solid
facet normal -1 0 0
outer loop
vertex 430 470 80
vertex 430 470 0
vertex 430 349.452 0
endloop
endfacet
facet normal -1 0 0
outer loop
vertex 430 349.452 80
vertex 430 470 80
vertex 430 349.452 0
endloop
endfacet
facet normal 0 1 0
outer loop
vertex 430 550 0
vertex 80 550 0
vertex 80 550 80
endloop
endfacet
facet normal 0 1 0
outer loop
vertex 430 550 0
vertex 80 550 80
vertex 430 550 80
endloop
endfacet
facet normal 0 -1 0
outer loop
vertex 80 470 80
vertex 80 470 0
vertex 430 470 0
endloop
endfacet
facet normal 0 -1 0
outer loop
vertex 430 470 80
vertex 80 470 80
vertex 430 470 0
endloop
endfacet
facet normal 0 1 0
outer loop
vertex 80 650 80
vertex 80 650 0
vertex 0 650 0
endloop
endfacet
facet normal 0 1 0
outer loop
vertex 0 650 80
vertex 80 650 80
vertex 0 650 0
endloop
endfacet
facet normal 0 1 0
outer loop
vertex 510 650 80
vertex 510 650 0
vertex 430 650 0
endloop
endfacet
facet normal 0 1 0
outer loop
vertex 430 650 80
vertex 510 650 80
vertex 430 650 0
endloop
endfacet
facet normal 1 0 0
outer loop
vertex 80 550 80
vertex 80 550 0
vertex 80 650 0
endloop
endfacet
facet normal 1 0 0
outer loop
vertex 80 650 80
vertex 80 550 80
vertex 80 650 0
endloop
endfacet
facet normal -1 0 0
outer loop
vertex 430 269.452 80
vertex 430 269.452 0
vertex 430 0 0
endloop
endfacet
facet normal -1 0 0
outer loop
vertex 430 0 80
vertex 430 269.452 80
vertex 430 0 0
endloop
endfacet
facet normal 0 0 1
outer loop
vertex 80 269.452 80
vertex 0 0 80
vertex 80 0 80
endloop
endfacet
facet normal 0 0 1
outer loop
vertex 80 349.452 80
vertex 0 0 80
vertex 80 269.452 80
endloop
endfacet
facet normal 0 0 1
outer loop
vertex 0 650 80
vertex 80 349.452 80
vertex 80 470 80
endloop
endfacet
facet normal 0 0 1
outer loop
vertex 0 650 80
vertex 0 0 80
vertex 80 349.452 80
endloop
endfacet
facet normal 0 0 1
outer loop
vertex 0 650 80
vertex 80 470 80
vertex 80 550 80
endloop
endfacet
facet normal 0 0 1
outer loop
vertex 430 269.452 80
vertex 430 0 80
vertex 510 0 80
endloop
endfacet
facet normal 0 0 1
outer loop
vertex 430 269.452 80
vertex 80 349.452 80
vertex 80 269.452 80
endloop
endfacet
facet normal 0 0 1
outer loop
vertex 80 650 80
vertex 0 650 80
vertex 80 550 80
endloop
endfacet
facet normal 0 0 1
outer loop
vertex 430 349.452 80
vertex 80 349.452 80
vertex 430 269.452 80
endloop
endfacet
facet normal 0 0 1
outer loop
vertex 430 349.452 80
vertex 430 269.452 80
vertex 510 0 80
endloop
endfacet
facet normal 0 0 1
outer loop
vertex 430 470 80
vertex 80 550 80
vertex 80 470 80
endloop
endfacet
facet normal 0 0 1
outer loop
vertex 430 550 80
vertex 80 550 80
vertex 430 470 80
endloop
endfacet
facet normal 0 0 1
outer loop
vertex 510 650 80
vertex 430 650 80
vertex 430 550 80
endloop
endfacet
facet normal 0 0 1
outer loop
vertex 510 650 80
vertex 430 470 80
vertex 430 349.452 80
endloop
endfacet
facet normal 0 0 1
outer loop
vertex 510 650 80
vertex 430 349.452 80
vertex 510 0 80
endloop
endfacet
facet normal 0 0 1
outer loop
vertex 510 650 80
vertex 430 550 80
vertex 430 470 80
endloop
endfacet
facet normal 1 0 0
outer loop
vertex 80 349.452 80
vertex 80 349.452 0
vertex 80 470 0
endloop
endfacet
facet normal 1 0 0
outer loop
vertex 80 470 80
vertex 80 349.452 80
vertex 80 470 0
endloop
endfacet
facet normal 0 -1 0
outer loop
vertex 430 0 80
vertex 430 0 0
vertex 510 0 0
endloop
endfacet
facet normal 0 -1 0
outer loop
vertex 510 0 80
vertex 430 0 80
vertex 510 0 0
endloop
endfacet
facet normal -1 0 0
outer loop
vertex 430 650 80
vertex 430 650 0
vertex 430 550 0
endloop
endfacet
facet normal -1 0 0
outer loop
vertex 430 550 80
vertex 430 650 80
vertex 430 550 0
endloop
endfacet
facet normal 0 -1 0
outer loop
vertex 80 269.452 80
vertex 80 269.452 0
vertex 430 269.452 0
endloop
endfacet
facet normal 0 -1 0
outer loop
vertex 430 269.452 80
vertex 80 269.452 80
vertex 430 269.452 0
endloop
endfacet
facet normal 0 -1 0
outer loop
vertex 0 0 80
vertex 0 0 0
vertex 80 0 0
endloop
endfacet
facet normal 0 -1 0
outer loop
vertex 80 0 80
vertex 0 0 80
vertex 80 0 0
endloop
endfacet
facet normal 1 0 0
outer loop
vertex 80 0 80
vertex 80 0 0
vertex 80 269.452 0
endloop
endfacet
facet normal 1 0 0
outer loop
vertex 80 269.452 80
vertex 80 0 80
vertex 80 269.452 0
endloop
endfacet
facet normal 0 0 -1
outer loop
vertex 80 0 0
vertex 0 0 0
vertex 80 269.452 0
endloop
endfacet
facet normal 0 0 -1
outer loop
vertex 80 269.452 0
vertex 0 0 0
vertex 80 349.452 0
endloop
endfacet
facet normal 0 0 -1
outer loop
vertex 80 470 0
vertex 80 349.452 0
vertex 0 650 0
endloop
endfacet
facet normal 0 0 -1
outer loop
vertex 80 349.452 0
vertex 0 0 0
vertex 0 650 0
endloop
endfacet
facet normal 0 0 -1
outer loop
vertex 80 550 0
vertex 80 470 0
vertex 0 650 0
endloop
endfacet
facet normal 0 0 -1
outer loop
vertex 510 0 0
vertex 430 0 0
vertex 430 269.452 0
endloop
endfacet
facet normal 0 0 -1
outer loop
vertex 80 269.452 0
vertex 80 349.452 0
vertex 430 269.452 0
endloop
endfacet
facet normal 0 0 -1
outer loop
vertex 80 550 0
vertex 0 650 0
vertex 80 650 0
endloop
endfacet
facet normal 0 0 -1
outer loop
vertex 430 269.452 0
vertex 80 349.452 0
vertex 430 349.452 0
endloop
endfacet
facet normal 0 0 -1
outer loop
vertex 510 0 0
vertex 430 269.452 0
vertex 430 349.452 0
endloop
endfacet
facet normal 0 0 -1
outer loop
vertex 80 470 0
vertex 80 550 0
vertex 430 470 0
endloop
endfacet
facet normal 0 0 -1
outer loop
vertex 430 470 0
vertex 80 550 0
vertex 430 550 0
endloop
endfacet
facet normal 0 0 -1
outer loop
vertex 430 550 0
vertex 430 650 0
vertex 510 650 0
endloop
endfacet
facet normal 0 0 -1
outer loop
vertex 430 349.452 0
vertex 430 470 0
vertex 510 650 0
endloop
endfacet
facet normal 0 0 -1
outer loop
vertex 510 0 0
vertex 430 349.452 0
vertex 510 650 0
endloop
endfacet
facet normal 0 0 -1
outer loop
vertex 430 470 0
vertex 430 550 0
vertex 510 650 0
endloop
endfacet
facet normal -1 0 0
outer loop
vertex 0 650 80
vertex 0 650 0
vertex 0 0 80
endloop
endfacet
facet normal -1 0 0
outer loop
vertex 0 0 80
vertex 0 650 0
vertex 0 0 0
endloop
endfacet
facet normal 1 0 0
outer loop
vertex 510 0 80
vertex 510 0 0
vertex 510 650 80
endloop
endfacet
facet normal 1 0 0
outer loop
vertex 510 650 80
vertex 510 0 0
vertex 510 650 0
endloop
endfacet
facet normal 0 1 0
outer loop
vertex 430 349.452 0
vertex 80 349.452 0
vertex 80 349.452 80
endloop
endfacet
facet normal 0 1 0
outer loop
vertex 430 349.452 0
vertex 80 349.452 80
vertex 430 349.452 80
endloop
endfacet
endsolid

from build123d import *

# Parameters (mm, degrees)
F0_W     = 350
F0_H     = 80
F1_DEPTH = 80


with BuildPart() as f1:
    # F0 (on Top) → F1 (new body)
    with BuildSketch(Plane.XY):
        Polygon((0, 650), (0, 0), (80, 0), (80, 269.4520485401), (79.9472002188, 269.4520485401), (80, 349.4520485401), (80, 470), (80, 550), (80, 650), align=None)
        Polygon((79.9472002188, 269.4520485401), (80, 269.4520485401), (80, 349.4520485401), align=None)
        with Locations((255, 309.4520485401)):
            Rectangle(F0_W, F0_H)
        Polygon((430, 349.4520485401), (430, 269.4520485401), (430, 0), (510, 0), (510, 650), (430, 650), (430, 550), (430, 470), align=None)
        with Locations((255, 510)):
            Rectangle(F0_W, F0_H)
    extrude(amount=F1_DEPTH)


solid = f1.part
